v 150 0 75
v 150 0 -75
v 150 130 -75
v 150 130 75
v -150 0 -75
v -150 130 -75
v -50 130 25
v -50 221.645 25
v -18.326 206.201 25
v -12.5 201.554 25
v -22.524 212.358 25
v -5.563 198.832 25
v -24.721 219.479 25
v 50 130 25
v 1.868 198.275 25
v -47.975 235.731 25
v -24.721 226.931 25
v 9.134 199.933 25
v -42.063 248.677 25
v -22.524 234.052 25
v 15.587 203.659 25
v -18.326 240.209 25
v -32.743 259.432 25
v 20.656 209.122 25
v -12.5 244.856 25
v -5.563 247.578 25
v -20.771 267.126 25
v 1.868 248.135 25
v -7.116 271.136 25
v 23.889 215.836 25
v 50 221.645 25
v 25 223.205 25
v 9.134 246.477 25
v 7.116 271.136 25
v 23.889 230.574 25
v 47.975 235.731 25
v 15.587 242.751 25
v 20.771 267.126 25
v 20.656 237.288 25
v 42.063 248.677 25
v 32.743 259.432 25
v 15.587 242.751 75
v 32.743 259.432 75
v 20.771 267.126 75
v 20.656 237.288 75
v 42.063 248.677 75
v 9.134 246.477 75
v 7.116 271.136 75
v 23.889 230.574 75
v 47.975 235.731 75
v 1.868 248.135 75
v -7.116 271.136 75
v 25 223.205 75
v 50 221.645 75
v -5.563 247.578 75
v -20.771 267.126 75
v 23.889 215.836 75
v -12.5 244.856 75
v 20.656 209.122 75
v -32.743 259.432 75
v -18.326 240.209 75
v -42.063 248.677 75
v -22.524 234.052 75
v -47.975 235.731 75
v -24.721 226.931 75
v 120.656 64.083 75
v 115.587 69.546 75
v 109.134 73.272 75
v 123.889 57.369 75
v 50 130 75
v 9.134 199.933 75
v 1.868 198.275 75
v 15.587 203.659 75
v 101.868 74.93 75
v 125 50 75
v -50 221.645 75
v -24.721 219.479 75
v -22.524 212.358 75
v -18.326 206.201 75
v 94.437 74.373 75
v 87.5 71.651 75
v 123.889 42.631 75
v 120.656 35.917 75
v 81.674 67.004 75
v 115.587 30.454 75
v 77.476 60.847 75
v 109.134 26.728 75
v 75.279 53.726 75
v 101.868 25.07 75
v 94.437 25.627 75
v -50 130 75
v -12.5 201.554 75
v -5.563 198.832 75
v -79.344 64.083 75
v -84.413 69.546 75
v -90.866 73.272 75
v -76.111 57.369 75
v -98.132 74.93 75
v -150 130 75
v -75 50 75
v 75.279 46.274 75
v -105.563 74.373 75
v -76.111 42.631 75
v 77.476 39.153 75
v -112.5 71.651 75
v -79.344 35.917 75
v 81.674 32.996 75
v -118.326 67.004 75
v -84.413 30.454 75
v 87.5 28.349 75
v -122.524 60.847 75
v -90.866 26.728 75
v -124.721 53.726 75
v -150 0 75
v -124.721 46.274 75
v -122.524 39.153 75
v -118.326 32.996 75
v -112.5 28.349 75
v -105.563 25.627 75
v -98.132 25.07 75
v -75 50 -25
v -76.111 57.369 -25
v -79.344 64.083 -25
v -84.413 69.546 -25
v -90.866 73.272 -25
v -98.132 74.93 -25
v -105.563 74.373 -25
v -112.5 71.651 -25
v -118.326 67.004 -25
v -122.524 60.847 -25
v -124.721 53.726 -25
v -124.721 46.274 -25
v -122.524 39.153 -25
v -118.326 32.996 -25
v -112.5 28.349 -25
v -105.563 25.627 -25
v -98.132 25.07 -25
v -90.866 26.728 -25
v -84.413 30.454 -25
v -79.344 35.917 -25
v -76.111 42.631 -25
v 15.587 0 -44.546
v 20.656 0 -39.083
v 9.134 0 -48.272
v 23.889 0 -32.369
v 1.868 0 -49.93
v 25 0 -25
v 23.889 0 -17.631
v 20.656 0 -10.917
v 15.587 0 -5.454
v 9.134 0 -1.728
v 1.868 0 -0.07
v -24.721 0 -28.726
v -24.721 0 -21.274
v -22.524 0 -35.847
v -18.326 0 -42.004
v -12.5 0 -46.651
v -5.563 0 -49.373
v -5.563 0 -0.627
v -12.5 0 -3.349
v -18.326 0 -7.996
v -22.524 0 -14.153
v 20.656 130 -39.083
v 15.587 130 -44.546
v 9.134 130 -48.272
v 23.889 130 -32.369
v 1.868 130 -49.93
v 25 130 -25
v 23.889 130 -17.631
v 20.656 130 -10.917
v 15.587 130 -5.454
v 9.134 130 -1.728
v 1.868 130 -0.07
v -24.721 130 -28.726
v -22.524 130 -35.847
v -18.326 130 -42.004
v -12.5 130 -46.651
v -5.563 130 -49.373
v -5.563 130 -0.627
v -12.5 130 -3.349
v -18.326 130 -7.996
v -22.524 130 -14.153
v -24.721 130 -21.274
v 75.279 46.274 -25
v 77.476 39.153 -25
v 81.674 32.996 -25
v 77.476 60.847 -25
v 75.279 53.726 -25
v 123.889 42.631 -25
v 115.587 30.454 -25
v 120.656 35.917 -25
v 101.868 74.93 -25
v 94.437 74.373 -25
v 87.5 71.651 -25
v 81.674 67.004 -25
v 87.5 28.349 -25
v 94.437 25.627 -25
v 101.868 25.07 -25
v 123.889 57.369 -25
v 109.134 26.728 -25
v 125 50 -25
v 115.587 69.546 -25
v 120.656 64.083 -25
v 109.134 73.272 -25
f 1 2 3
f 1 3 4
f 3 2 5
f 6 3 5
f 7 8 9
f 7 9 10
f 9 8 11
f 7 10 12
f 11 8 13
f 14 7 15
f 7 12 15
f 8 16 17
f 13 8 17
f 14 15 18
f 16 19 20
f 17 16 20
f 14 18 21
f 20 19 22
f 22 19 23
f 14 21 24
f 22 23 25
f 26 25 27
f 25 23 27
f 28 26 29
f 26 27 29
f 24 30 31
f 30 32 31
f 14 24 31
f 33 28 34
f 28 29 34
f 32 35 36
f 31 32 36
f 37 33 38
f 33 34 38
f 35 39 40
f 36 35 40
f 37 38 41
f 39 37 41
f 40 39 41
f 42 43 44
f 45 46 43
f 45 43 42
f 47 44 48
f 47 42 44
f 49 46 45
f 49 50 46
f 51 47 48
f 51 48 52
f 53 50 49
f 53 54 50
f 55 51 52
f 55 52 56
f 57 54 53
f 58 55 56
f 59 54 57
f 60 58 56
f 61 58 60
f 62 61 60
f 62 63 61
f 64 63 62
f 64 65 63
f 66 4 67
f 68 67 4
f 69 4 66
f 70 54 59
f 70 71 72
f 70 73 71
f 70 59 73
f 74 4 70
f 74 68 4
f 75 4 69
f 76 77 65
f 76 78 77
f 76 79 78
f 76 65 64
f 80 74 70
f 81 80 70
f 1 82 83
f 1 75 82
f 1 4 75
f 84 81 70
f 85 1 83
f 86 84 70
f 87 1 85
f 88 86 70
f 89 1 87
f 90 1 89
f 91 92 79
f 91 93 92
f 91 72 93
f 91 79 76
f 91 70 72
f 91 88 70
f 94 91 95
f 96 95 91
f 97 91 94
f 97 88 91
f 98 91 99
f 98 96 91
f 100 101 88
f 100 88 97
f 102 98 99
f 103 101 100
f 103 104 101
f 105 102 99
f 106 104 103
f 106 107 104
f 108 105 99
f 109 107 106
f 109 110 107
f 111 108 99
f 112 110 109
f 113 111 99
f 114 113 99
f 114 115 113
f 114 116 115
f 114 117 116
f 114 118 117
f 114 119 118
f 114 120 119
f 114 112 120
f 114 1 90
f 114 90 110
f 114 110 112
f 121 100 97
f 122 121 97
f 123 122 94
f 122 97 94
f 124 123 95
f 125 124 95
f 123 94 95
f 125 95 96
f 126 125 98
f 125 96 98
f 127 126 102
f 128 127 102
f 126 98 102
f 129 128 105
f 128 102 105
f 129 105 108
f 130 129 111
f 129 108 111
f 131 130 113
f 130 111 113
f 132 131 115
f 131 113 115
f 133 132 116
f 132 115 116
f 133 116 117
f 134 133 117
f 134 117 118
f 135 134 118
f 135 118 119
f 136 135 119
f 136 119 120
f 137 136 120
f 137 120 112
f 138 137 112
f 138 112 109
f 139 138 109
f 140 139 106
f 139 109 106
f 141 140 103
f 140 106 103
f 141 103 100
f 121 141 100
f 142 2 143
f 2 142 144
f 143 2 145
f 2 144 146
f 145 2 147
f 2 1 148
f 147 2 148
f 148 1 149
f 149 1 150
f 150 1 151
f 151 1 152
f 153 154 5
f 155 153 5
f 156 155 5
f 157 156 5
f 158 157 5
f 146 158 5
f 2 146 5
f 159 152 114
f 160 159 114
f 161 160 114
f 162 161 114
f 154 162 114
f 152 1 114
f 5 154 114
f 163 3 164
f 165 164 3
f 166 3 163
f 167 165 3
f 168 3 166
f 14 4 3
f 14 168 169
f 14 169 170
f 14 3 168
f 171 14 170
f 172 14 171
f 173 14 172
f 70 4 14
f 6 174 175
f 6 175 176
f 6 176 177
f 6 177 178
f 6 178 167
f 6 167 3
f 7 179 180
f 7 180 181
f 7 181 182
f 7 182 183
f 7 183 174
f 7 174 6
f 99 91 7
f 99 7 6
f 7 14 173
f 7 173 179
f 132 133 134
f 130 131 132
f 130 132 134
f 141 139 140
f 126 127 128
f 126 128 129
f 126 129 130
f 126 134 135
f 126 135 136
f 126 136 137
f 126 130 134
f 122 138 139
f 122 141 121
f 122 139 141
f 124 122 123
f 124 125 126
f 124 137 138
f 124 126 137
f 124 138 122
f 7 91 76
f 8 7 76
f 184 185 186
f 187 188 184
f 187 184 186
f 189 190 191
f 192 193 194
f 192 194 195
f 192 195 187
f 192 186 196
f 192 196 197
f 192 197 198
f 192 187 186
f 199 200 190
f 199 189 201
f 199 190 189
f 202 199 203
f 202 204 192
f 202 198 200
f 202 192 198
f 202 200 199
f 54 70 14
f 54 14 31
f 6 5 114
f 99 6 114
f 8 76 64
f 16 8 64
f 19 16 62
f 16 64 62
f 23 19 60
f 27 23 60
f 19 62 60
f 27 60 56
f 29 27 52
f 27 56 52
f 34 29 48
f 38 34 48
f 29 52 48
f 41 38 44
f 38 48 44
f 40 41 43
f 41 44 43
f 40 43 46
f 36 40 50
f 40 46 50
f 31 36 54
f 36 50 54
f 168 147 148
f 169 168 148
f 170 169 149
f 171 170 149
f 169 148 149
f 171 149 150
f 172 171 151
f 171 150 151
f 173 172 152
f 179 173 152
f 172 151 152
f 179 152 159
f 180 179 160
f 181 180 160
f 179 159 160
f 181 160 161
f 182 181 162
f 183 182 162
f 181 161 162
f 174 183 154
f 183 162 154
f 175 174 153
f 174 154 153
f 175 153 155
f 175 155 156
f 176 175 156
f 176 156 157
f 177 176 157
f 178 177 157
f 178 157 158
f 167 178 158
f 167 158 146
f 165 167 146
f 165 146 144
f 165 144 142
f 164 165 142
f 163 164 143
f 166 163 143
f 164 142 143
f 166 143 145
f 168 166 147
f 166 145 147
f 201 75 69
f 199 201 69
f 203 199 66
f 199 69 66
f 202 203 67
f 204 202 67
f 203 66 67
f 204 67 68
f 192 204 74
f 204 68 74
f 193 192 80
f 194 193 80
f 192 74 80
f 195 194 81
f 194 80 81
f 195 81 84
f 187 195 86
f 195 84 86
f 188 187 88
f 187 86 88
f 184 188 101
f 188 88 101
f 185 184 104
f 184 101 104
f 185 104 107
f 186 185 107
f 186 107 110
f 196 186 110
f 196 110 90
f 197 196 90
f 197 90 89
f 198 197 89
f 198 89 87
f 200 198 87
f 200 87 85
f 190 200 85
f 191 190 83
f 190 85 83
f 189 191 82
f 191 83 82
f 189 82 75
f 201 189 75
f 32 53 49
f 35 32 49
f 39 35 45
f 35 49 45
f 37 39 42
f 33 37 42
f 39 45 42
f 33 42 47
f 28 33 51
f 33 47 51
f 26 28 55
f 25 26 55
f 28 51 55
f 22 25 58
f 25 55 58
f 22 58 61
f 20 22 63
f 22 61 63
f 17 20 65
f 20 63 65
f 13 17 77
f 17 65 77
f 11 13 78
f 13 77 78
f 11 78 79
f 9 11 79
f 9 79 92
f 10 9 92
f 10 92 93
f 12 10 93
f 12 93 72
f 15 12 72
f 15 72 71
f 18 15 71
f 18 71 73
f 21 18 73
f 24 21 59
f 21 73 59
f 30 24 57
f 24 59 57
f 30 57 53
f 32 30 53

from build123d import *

# Parameters (mm, degrees)
F0_W      = 160
F0_H      = 160
F1_DEPTH  = 160
F4_W      = 300
F4_H      = 150
F5_DEPTH  = 130
F6_W      = 100
F6_H      = 143
F7_DEPTH  = 50
F8_R      = 25
F9_DEPTH  = 100
F10_R     = 25
F11_DEPTH = 50
F13_DEPTH = 50
F14_R     = 25
F15_DEPTH = 130


with BuildPart() as f1:
    # F0 (on Front) → F1 (new body)
    with BuildSketch(Plane.XZ):
        Rectangle(F0_W, F0_H)
    extrude(amount=F1_DEPTH)


with BuildPart() as f5:
    # F4 (on face) → F5 (new body)
    with BuildSketch(Plane(origin=(0, 0, 0), x_dir=(-1, 0, 0), z_dir=(0, 1, 0))):
        Rectangle(F4_W, F4_H)
    extrude(amount=F5_DEPTH)

    # F6 (on face) → F7 (join)
    with BuildSketch(Plane.XY.offset(75)):
        with Locations((0, 201.5)):
            Rectangle(F6_W, F6_H)
    extrude(amount=-F7_DEPTH)

    # F8 (on face) → F9 (cut)
    with BuildSketch(Plane.XY.offset(75)):
        with Locations((100, 50)):
            Circle(F8_R)
        with Locations((-100, 50)):
            Circle(F8_R)
    extrude(amount=-F9_DEPTH, mode=Mode.SUBTRACT)

    # F10 (on face) → F11 (cut)
    with BuildSketch(Plane.XY.offset(75)):
        with Locations((0, 223.2050807569)):
            Circle(F10_R)
    extrude(amount=-F11_DEPTH, mode=Mode.SUBTRACT)

    # F12 (on face) → F13 (cut)
    with BuildSketch(Plane.XY.offset(75)):
        with BuildLine():
            ThreePointArc((-50, 221.6448485851), (0, 271.6448485851), (50, 221.6448485851))
            Line((50, 221.6448485851), (50, 273))
            Line((50, 273), (-50, 273))
            Line((-50, 273), (-50, 221.6448485851))
        make_face()
    extrude(amount=-F13_DEPTH, mode=Mode.SUBTRACT)

    # F14 (on face) → F15 (cut)
    with BuildSketch(Plane.XZ):
        with Locations((0, -25)):
            Circle(F14_R)
    extrude(amount=-F15_DEPTH, mode=Mode.SUBTRACT)


solid = f5.part
